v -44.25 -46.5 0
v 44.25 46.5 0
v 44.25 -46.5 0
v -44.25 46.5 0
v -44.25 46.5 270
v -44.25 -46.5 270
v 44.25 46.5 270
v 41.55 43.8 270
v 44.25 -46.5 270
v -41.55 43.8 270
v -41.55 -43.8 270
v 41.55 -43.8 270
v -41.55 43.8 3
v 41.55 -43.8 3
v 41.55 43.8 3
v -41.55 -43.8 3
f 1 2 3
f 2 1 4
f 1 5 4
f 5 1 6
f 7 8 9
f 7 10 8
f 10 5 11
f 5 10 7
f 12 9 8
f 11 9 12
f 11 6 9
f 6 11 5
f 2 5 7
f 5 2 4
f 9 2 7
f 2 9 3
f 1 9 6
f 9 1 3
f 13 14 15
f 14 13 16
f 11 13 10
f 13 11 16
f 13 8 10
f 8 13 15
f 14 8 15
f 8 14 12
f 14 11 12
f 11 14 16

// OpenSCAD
// file: vars.scad
echo(version=version());
//All dimensions are in mm

l = 133; // lenght of box in x dir
w = 68;  // width of box in y dir
h=32;    // height of box without lid
wall=2;  // wall thickness
postloc=28; // where the edge posts are in y direction
postsize=[1.85,3] ;  //Dimension of posts in x and y
basethickness=3;
holdslotloc=81.5;
holdslotwidth=10;
wireholddiameter = 10;
switchcutout = [29.2,22.7];
//Perforation size: 23mm*10.5mm
voltmetercutout=[24,11.5];
// Allow for slip by making the ridge a little smaller than the box it fits into.
interference=0.8;


BatteryHeight=67;
BatteryWidth=62.5;
BatteryDepth=265;
BatteryPadding=7;
BMCThickness=10;
WiringAllowance=10;
WallThickness=3.0;
// main file
include <vars.scad>;

BoxPart1Height=BatteryDepth + WiringAllowance + BMCThickness-15;


color("blue")
   difference() {
        linear_extrude(height = BoxPart1Height )
            square([BatteryWidth+WallThickness*4+BatteryPadding*2, 
                    BatteryHeight+WallThickness*4+BatteryPadding*2
            ], center = true);
       translate ([0,0,WallThickness])
         linear_extrude(height = BoxPart1Height) // Outside dimensions of the edge, plus 0.6 for clearence
            square([BatteryWidth+WallThickness*2+BatteryPadding*2+.6, 
                    BatteryHeight+WallThickness*2+BatteryPadding*2+.6
            ], center = true)   ;

     // this hole is for a small voltmeter translate([-w+23.5+8*wall,l/2+1,basethickness+6])
    //rotate([90,0,0])
        translate ([0,0,-0.1])
        linear_extrude(height = 0)
            square(voltmetercutout,
            center = false);

       
}
